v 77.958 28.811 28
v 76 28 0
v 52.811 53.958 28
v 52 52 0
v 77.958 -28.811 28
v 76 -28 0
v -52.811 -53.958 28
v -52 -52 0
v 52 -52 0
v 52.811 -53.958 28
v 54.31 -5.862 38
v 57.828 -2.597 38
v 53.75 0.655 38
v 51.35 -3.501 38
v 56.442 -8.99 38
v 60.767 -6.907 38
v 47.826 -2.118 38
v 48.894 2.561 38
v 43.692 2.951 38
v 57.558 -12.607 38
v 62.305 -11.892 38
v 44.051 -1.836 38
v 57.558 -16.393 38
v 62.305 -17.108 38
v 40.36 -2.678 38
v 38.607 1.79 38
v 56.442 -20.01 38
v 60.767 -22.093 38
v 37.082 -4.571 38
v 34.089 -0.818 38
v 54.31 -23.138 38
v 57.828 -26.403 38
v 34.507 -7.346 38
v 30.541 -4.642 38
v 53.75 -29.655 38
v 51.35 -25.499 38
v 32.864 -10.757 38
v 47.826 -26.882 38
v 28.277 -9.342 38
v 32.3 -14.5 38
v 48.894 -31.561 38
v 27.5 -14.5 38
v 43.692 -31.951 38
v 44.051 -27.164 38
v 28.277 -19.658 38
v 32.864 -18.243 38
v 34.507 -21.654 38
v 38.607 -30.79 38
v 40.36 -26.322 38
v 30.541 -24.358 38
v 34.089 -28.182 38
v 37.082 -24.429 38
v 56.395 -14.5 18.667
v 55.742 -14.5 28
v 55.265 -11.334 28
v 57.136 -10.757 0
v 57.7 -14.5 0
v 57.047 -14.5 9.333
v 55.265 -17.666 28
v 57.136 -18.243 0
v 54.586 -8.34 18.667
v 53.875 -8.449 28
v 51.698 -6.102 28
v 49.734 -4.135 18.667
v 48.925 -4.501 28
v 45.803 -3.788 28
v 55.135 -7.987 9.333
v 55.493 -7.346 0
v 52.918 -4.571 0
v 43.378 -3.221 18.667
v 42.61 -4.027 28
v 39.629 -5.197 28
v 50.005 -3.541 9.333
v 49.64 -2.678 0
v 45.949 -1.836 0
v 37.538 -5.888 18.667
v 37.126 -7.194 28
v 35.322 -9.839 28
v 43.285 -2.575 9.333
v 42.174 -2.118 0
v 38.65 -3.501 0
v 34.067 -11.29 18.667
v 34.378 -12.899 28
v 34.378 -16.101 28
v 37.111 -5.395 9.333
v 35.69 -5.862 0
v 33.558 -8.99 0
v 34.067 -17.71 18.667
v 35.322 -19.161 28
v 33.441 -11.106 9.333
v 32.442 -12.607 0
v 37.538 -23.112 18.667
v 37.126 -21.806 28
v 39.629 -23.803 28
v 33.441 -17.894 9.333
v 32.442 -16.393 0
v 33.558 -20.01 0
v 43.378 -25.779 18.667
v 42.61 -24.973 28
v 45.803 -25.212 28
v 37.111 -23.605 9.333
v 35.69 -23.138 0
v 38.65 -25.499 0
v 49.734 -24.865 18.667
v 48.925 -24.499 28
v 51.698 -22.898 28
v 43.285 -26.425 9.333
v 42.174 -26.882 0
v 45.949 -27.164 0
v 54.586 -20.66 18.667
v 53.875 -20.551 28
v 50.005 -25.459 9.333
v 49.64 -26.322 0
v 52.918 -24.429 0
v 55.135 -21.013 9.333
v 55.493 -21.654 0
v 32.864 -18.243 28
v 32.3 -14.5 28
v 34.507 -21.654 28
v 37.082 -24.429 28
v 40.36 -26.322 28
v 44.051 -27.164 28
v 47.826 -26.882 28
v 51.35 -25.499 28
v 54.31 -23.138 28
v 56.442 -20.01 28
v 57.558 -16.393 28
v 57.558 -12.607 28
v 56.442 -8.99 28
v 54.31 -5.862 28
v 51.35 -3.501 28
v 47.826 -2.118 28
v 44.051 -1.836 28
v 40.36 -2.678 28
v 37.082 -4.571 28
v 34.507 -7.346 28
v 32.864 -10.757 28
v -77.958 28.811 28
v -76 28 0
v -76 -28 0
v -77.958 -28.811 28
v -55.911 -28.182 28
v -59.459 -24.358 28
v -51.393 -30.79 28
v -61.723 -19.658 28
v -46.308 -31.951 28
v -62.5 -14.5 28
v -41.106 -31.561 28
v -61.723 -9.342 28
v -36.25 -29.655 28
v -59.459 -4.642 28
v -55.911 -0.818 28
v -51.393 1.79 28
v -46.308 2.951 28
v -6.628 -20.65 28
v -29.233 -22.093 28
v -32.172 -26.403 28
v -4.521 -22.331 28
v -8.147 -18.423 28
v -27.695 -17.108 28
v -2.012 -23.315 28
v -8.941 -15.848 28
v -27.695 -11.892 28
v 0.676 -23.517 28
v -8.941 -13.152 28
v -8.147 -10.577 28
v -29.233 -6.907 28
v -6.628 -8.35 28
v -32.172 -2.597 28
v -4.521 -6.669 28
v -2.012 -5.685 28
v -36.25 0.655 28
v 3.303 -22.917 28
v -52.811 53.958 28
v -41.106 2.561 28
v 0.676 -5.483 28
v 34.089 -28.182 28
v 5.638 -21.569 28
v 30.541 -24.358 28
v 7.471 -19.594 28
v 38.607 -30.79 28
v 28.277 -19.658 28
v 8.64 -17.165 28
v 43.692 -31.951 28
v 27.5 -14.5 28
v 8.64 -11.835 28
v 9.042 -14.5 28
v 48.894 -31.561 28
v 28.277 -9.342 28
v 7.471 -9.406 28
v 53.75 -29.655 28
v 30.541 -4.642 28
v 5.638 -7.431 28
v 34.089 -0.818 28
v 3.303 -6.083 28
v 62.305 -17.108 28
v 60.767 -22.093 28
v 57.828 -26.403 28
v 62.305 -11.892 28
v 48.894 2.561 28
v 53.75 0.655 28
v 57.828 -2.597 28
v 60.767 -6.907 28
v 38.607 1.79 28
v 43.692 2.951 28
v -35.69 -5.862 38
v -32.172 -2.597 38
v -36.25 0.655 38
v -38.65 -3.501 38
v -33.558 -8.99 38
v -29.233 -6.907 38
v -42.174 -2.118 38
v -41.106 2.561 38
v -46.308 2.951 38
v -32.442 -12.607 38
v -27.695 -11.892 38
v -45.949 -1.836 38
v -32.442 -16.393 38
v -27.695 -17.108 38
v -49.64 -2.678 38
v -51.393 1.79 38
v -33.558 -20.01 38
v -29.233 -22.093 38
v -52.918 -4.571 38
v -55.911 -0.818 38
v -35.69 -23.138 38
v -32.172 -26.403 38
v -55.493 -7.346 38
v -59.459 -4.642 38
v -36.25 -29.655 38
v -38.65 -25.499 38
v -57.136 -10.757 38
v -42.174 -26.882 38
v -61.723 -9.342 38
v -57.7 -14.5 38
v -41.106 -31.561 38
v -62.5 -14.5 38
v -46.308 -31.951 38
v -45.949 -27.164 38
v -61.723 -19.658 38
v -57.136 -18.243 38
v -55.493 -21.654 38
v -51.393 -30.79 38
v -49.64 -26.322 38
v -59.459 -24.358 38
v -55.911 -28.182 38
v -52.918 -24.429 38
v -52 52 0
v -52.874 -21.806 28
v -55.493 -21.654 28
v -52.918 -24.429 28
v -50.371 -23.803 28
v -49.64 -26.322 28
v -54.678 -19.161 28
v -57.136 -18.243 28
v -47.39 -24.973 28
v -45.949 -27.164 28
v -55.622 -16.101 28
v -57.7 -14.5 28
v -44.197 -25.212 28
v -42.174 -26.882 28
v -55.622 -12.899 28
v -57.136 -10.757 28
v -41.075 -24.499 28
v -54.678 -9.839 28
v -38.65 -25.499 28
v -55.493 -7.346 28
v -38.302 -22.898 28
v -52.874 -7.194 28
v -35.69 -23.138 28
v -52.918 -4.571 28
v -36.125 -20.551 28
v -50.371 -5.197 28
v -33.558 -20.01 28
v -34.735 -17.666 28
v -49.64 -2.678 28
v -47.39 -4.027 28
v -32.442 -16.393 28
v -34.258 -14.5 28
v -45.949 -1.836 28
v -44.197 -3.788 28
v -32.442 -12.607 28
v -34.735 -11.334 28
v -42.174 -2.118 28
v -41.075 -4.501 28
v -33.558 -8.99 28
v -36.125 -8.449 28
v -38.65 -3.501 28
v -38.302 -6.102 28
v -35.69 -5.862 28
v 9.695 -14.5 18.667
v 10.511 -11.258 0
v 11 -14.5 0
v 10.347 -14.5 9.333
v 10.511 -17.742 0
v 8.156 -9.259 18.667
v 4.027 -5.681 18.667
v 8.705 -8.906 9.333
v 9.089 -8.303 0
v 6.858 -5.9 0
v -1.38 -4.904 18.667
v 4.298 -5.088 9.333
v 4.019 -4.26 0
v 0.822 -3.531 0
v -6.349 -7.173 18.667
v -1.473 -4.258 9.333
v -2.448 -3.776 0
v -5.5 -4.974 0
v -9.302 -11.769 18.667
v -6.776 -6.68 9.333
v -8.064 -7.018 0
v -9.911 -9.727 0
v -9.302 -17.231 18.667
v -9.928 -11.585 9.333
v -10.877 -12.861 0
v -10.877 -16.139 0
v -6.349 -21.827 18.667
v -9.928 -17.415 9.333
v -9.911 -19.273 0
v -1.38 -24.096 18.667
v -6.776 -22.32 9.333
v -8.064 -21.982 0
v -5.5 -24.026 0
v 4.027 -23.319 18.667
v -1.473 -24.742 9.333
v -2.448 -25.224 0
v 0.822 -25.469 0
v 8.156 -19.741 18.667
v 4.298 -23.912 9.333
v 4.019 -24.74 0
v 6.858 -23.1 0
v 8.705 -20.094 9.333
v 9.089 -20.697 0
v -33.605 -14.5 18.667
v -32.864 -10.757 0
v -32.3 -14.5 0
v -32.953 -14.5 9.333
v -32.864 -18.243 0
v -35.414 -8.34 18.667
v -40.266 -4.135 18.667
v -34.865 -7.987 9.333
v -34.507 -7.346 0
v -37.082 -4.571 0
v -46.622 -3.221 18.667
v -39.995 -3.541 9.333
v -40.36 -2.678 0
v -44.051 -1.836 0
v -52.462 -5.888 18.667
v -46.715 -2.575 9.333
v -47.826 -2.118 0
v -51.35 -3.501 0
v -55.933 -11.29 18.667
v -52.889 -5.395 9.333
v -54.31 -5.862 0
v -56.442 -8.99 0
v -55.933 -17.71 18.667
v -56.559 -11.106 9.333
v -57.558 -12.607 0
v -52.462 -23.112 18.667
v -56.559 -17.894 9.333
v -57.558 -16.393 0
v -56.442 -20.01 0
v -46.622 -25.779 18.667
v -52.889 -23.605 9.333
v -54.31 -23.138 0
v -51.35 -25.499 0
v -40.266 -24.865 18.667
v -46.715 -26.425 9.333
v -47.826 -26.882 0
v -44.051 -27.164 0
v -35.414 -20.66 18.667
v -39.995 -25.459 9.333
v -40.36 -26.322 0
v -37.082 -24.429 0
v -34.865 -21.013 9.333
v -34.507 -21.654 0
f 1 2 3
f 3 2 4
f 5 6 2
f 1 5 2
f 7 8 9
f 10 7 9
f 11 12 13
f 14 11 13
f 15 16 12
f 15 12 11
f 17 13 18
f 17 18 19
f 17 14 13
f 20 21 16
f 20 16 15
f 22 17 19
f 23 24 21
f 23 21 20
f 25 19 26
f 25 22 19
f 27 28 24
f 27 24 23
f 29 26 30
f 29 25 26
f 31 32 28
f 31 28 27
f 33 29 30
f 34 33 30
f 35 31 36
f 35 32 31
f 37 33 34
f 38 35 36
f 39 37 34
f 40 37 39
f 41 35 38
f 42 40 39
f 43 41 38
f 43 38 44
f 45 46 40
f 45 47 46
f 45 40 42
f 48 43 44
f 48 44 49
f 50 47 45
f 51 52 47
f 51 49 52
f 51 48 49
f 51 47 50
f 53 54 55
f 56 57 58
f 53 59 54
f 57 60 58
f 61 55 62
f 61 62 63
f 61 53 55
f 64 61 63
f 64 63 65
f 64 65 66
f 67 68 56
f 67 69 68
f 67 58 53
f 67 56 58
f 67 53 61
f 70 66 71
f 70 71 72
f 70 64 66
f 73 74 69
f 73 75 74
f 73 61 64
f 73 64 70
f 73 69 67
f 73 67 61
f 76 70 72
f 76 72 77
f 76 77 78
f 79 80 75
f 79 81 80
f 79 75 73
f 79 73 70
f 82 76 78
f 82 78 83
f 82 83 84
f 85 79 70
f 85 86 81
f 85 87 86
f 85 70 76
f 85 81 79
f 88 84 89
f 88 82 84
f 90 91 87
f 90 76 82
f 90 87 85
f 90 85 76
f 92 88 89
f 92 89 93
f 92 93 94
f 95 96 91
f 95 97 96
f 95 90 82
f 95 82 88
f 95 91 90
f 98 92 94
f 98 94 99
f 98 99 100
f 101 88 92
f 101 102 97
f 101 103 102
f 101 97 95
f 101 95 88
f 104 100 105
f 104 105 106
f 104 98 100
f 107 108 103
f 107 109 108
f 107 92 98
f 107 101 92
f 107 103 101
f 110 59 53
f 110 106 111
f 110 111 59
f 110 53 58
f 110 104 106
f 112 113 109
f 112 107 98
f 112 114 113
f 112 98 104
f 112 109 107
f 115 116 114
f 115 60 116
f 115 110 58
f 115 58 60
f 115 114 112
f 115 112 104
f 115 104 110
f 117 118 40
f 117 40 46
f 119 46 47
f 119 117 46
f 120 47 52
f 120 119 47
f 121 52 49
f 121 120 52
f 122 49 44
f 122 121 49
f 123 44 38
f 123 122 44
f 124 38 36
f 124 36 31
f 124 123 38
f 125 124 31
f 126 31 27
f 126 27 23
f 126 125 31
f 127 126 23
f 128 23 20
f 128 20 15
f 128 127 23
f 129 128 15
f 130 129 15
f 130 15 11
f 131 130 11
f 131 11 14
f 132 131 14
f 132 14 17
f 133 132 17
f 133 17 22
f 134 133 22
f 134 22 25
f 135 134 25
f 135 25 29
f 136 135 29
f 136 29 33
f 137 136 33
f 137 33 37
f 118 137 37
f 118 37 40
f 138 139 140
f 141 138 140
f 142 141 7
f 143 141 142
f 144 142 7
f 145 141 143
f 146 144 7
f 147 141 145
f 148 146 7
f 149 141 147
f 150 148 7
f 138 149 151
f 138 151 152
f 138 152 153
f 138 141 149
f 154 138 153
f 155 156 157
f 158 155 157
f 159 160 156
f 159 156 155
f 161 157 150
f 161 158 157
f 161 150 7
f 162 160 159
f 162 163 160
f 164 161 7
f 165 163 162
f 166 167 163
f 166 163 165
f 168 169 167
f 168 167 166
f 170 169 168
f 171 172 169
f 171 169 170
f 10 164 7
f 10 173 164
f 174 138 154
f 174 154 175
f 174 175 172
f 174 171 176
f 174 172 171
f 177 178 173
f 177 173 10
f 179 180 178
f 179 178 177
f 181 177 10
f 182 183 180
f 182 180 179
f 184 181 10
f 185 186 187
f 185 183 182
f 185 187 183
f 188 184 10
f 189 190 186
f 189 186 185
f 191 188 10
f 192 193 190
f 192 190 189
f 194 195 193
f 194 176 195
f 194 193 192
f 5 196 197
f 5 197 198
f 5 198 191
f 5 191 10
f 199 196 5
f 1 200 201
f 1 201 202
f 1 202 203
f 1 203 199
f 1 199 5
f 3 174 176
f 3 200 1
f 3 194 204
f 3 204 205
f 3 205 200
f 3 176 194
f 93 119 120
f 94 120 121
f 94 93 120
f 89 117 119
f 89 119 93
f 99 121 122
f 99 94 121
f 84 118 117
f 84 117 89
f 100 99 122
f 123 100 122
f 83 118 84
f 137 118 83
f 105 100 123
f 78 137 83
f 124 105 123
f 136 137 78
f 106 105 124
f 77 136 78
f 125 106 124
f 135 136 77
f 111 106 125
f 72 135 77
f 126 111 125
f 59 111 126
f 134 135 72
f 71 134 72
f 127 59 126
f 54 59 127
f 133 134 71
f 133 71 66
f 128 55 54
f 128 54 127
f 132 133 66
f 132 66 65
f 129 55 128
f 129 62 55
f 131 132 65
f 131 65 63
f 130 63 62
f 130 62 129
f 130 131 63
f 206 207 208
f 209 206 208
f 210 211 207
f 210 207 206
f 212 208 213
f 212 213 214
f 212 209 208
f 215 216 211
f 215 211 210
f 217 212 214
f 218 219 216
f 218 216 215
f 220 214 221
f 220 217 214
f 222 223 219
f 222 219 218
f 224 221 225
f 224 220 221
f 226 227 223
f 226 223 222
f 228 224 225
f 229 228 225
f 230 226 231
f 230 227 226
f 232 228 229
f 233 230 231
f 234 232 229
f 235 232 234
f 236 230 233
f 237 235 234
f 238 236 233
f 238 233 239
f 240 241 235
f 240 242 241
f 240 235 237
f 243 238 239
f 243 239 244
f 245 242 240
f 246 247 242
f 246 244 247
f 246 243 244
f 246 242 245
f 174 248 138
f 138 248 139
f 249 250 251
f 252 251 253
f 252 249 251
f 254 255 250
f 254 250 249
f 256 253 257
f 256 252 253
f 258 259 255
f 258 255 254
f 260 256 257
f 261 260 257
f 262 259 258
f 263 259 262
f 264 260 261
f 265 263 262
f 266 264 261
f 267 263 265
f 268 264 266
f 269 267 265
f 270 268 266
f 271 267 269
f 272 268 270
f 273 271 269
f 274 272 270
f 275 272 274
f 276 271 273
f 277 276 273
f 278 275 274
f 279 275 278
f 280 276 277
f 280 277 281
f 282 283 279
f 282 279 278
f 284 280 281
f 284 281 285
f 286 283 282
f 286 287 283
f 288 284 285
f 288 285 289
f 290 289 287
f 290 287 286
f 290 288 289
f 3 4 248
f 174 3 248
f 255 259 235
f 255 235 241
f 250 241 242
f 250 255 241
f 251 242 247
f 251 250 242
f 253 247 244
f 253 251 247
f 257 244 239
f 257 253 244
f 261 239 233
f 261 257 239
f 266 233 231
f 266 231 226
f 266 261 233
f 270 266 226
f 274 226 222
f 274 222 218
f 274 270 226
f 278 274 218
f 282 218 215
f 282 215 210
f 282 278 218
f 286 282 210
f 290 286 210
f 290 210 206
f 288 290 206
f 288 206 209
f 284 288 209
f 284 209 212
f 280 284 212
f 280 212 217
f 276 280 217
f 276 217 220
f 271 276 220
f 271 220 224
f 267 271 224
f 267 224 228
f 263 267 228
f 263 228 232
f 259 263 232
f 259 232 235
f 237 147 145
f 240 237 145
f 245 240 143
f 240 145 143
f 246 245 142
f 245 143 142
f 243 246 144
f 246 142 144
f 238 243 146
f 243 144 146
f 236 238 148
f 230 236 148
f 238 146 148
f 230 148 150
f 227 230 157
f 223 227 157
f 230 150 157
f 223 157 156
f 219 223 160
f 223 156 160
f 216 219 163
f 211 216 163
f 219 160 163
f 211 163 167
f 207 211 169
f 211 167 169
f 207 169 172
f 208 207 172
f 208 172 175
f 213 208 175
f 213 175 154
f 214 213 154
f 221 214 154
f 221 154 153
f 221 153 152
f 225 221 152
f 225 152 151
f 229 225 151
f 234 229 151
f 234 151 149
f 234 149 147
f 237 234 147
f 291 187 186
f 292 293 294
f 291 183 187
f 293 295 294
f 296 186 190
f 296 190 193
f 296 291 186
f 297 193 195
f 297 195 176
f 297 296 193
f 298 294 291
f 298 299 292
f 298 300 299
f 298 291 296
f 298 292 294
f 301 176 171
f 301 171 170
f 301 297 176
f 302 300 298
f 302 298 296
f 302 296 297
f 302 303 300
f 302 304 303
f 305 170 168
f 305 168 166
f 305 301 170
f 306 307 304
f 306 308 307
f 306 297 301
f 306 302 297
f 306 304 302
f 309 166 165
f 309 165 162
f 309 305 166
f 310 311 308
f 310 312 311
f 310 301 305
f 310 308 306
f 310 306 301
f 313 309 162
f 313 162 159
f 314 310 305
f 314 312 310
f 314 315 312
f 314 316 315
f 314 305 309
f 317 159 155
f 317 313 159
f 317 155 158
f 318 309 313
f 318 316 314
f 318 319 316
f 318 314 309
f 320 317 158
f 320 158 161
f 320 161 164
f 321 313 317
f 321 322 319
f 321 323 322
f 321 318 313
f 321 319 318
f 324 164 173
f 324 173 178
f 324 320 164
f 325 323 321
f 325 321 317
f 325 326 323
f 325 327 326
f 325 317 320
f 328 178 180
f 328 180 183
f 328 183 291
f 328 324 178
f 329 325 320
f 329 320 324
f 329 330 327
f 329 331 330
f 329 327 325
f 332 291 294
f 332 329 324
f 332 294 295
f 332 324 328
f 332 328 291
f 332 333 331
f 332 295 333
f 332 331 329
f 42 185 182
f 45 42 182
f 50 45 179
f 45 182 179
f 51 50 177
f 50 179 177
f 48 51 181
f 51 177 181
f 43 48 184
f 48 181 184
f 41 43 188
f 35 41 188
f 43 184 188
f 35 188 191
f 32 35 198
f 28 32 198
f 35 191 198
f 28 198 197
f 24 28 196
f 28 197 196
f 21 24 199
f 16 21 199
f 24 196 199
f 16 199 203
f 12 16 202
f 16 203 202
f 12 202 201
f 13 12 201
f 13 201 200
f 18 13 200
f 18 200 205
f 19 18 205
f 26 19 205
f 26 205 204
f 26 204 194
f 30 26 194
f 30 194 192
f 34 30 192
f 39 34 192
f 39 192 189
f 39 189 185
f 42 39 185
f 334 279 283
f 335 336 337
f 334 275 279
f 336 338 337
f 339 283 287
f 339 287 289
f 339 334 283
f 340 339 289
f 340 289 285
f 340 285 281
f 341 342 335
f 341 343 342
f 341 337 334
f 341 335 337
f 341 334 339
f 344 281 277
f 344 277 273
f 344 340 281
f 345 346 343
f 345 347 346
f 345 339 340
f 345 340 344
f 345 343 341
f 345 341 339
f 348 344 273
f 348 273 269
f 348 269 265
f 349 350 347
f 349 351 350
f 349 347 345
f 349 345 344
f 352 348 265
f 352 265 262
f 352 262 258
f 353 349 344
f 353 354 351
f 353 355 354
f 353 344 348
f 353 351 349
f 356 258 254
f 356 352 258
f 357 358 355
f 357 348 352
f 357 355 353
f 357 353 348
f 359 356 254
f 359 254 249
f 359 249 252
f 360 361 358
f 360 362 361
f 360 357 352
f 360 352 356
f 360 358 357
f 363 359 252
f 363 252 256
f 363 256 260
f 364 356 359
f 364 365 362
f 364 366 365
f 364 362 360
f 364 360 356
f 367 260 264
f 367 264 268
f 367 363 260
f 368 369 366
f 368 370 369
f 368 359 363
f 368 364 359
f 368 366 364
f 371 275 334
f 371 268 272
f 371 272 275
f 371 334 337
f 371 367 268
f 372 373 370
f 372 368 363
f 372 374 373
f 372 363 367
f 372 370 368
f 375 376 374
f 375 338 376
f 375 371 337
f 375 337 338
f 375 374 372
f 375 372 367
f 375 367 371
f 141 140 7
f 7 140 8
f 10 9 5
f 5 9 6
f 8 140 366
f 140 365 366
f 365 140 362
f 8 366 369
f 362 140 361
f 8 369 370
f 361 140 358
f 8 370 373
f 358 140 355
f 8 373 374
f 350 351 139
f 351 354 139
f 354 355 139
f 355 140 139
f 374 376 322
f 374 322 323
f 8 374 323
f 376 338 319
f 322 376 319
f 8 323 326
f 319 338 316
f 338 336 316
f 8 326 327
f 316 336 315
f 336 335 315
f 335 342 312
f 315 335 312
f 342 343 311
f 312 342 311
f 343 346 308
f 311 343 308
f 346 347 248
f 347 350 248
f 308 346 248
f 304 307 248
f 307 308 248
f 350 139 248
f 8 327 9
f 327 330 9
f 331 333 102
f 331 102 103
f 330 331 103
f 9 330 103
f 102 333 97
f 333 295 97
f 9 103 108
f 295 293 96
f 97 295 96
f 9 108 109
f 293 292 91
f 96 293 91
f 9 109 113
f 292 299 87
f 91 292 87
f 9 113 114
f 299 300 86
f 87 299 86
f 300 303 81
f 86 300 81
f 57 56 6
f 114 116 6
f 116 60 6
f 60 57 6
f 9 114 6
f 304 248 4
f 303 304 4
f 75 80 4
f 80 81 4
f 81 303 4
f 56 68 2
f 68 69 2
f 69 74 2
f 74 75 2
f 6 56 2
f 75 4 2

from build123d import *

# Parameters (mm, degrees)
SKETCH1_R           = 12.7
SKETCH1_R_2         = 11
BOSS_EXTRUDE1_DEPTH = 28
BOSS_EXTRUDE1_DRAFT = -4
SKETCH2_R           = 17.5
SKETCH2_R_2         = 12.7
BOSS_EXTRUDE2_DEPTH = 38


with BuildPart() as part:
    # Sketch1 → Boss-Extrude1 (with draft: the straight prism first)
    with BuildSketch(Plane.XY):
        Polygon((-52, 52), (-76, 28), (-76, -28), (-52, -52), (52, -52), (76, -28), (76, 28), (52, 52), align=None)
        with Locations((-45, -14.5)):
            Circle(SKETCH1_R, mode=Mode.SUBTRACT)
        with Locations((45, -14.5)):
            Circle(SKETCH1_R, mode=Mode.SUBTRACT)
        with Locations((0, -14.5)):
            Circle(SKETCH1_R_2, mode=Mode.SUBTRACT)
    extrude(amount=BOSS_EXTRUDE1_DEPTH)
    # Boss-Extrude1: the draft: its side faces are tilted about the plane it starts from
    boss_extrude1_sides = [part.faces().sort_by_distance(p)[0] for p in [
        (-64, 40, 14),
        (-76, 0, 14),
        (-64, -40, 14),
        (0, -52, 14),
        (64, -40, 14),
        (76, 0, 14),
        (64, 40, 14),
        (0, 52, 14),
        (-57.7, -14.5, 14),
        (32.3, -14.5, 14),
        (-11, -14.5, 14),
    ]]
    draft(boss_extrude1_sides, Plane.XY, BOSS_EXTRUDE1_DRAFT)

    # Sketch2 → Boss-Extrude2 (add)
    # profile 1 of 2: a face of its own
    with BuildSketch(Plane.XY):
        with Locations(Location((-45, -14.5, 0), (0, 0, 180))):
            Circle(SKETCH2_R)
        with Locations(Location((-45, -14.5, 0), (0, 0, 180))):
            Circle(SKETCH2_R_2, mode=Mode.SUBTRACT)
    # profile 2 of 2: a face of its own
    with BuildSketch(Plane.XY):
        with Locations(Location((45, -14.5, 0), (0, 0, 180))):
            Circle(SKETCH2_R)
        with Locations(Location((45, -14.5, 0), (0, 0, 180))):
            Circle(SKETCH2_R_2, mode=Mode.SUBTRACT)
    extrude(amount=BOSS_EXTRUDE2_DEPTH)


solid = part.part
